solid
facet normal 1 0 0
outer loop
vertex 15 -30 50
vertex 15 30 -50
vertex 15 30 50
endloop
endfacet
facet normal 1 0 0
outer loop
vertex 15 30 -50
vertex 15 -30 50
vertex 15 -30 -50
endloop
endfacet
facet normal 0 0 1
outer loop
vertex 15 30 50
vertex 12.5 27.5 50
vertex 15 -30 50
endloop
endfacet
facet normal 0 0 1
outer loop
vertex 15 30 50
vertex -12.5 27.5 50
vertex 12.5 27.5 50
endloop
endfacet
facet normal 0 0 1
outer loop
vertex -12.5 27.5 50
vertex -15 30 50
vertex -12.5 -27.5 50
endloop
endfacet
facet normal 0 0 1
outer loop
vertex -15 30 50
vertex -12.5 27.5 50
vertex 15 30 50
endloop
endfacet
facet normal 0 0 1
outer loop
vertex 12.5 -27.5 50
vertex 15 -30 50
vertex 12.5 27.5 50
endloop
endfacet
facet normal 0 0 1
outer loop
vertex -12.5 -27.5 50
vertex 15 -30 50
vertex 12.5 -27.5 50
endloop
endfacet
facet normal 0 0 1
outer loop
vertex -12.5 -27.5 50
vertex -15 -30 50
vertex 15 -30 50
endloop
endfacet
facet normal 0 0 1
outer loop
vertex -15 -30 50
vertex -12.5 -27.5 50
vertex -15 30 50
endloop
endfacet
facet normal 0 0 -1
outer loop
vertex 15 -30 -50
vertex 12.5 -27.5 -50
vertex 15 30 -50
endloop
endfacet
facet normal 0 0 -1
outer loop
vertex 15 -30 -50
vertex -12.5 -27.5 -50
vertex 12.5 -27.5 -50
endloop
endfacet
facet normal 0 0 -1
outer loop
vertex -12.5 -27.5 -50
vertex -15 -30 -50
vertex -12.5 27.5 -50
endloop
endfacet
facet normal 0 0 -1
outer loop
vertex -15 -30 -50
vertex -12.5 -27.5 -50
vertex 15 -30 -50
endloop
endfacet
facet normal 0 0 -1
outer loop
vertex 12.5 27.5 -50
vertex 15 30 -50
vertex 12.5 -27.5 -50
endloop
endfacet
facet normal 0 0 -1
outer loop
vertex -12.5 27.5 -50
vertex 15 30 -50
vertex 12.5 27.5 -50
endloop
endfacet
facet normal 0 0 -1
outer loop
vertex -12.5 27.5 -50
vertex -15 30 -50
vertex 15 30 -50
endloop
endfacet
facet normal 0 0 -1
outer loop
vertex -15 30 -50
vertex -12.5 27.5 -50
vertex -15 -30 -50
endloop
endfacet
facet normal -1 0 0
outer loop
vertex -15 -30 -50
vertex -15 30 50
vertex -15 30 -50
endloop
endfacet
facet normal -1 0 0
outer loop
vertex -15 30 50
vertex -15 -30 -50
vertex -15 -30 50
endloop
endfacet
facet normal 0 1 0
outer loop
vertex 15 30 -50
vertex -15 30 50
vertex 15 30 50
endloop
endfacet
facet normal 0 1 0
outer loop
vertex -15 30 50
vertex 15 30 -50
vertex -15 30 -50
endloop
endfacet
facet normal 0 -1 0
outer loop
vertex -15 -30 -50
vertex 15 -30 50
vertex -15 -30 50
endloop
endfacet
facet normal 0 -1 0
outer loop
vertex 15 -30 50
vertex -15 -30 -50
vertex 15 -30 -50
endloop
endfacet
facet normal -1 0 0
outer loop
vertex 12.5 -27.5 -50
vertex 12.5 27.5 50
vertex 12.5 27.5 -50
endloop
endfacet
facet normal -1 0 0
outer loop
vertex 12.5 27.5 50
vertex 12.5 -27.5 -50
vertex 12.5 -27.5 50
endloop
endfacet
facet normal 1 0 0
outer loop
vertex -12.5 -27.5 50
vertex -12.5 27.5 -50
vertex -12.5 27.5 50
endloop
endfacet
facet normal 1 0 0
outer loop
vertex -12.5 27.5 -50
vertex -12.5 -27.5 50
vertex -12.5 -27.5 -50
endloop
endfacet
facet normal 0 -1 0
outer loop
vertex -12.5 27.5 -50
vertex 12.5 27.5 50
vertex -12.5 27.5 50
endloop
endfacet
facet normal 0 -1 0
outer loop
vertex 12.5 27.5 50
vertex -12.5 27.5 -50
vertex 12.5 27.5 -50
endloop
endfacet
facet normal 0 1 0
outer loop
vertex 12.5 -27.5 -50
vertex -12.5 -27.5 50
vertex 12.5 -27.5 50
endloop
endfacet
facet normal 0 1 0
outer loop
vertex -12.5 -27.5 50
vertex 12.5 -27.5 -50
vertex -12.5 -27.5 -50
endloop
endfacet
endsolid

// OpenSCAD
module aluminium_extrusion() {
    difference() {
        cube([30, 60, 100], center = true);
        translate([-12.5, -27.5, -50])
            cube([25, 55, 100], center = false);
    }
}

aluminium_extrusion();
